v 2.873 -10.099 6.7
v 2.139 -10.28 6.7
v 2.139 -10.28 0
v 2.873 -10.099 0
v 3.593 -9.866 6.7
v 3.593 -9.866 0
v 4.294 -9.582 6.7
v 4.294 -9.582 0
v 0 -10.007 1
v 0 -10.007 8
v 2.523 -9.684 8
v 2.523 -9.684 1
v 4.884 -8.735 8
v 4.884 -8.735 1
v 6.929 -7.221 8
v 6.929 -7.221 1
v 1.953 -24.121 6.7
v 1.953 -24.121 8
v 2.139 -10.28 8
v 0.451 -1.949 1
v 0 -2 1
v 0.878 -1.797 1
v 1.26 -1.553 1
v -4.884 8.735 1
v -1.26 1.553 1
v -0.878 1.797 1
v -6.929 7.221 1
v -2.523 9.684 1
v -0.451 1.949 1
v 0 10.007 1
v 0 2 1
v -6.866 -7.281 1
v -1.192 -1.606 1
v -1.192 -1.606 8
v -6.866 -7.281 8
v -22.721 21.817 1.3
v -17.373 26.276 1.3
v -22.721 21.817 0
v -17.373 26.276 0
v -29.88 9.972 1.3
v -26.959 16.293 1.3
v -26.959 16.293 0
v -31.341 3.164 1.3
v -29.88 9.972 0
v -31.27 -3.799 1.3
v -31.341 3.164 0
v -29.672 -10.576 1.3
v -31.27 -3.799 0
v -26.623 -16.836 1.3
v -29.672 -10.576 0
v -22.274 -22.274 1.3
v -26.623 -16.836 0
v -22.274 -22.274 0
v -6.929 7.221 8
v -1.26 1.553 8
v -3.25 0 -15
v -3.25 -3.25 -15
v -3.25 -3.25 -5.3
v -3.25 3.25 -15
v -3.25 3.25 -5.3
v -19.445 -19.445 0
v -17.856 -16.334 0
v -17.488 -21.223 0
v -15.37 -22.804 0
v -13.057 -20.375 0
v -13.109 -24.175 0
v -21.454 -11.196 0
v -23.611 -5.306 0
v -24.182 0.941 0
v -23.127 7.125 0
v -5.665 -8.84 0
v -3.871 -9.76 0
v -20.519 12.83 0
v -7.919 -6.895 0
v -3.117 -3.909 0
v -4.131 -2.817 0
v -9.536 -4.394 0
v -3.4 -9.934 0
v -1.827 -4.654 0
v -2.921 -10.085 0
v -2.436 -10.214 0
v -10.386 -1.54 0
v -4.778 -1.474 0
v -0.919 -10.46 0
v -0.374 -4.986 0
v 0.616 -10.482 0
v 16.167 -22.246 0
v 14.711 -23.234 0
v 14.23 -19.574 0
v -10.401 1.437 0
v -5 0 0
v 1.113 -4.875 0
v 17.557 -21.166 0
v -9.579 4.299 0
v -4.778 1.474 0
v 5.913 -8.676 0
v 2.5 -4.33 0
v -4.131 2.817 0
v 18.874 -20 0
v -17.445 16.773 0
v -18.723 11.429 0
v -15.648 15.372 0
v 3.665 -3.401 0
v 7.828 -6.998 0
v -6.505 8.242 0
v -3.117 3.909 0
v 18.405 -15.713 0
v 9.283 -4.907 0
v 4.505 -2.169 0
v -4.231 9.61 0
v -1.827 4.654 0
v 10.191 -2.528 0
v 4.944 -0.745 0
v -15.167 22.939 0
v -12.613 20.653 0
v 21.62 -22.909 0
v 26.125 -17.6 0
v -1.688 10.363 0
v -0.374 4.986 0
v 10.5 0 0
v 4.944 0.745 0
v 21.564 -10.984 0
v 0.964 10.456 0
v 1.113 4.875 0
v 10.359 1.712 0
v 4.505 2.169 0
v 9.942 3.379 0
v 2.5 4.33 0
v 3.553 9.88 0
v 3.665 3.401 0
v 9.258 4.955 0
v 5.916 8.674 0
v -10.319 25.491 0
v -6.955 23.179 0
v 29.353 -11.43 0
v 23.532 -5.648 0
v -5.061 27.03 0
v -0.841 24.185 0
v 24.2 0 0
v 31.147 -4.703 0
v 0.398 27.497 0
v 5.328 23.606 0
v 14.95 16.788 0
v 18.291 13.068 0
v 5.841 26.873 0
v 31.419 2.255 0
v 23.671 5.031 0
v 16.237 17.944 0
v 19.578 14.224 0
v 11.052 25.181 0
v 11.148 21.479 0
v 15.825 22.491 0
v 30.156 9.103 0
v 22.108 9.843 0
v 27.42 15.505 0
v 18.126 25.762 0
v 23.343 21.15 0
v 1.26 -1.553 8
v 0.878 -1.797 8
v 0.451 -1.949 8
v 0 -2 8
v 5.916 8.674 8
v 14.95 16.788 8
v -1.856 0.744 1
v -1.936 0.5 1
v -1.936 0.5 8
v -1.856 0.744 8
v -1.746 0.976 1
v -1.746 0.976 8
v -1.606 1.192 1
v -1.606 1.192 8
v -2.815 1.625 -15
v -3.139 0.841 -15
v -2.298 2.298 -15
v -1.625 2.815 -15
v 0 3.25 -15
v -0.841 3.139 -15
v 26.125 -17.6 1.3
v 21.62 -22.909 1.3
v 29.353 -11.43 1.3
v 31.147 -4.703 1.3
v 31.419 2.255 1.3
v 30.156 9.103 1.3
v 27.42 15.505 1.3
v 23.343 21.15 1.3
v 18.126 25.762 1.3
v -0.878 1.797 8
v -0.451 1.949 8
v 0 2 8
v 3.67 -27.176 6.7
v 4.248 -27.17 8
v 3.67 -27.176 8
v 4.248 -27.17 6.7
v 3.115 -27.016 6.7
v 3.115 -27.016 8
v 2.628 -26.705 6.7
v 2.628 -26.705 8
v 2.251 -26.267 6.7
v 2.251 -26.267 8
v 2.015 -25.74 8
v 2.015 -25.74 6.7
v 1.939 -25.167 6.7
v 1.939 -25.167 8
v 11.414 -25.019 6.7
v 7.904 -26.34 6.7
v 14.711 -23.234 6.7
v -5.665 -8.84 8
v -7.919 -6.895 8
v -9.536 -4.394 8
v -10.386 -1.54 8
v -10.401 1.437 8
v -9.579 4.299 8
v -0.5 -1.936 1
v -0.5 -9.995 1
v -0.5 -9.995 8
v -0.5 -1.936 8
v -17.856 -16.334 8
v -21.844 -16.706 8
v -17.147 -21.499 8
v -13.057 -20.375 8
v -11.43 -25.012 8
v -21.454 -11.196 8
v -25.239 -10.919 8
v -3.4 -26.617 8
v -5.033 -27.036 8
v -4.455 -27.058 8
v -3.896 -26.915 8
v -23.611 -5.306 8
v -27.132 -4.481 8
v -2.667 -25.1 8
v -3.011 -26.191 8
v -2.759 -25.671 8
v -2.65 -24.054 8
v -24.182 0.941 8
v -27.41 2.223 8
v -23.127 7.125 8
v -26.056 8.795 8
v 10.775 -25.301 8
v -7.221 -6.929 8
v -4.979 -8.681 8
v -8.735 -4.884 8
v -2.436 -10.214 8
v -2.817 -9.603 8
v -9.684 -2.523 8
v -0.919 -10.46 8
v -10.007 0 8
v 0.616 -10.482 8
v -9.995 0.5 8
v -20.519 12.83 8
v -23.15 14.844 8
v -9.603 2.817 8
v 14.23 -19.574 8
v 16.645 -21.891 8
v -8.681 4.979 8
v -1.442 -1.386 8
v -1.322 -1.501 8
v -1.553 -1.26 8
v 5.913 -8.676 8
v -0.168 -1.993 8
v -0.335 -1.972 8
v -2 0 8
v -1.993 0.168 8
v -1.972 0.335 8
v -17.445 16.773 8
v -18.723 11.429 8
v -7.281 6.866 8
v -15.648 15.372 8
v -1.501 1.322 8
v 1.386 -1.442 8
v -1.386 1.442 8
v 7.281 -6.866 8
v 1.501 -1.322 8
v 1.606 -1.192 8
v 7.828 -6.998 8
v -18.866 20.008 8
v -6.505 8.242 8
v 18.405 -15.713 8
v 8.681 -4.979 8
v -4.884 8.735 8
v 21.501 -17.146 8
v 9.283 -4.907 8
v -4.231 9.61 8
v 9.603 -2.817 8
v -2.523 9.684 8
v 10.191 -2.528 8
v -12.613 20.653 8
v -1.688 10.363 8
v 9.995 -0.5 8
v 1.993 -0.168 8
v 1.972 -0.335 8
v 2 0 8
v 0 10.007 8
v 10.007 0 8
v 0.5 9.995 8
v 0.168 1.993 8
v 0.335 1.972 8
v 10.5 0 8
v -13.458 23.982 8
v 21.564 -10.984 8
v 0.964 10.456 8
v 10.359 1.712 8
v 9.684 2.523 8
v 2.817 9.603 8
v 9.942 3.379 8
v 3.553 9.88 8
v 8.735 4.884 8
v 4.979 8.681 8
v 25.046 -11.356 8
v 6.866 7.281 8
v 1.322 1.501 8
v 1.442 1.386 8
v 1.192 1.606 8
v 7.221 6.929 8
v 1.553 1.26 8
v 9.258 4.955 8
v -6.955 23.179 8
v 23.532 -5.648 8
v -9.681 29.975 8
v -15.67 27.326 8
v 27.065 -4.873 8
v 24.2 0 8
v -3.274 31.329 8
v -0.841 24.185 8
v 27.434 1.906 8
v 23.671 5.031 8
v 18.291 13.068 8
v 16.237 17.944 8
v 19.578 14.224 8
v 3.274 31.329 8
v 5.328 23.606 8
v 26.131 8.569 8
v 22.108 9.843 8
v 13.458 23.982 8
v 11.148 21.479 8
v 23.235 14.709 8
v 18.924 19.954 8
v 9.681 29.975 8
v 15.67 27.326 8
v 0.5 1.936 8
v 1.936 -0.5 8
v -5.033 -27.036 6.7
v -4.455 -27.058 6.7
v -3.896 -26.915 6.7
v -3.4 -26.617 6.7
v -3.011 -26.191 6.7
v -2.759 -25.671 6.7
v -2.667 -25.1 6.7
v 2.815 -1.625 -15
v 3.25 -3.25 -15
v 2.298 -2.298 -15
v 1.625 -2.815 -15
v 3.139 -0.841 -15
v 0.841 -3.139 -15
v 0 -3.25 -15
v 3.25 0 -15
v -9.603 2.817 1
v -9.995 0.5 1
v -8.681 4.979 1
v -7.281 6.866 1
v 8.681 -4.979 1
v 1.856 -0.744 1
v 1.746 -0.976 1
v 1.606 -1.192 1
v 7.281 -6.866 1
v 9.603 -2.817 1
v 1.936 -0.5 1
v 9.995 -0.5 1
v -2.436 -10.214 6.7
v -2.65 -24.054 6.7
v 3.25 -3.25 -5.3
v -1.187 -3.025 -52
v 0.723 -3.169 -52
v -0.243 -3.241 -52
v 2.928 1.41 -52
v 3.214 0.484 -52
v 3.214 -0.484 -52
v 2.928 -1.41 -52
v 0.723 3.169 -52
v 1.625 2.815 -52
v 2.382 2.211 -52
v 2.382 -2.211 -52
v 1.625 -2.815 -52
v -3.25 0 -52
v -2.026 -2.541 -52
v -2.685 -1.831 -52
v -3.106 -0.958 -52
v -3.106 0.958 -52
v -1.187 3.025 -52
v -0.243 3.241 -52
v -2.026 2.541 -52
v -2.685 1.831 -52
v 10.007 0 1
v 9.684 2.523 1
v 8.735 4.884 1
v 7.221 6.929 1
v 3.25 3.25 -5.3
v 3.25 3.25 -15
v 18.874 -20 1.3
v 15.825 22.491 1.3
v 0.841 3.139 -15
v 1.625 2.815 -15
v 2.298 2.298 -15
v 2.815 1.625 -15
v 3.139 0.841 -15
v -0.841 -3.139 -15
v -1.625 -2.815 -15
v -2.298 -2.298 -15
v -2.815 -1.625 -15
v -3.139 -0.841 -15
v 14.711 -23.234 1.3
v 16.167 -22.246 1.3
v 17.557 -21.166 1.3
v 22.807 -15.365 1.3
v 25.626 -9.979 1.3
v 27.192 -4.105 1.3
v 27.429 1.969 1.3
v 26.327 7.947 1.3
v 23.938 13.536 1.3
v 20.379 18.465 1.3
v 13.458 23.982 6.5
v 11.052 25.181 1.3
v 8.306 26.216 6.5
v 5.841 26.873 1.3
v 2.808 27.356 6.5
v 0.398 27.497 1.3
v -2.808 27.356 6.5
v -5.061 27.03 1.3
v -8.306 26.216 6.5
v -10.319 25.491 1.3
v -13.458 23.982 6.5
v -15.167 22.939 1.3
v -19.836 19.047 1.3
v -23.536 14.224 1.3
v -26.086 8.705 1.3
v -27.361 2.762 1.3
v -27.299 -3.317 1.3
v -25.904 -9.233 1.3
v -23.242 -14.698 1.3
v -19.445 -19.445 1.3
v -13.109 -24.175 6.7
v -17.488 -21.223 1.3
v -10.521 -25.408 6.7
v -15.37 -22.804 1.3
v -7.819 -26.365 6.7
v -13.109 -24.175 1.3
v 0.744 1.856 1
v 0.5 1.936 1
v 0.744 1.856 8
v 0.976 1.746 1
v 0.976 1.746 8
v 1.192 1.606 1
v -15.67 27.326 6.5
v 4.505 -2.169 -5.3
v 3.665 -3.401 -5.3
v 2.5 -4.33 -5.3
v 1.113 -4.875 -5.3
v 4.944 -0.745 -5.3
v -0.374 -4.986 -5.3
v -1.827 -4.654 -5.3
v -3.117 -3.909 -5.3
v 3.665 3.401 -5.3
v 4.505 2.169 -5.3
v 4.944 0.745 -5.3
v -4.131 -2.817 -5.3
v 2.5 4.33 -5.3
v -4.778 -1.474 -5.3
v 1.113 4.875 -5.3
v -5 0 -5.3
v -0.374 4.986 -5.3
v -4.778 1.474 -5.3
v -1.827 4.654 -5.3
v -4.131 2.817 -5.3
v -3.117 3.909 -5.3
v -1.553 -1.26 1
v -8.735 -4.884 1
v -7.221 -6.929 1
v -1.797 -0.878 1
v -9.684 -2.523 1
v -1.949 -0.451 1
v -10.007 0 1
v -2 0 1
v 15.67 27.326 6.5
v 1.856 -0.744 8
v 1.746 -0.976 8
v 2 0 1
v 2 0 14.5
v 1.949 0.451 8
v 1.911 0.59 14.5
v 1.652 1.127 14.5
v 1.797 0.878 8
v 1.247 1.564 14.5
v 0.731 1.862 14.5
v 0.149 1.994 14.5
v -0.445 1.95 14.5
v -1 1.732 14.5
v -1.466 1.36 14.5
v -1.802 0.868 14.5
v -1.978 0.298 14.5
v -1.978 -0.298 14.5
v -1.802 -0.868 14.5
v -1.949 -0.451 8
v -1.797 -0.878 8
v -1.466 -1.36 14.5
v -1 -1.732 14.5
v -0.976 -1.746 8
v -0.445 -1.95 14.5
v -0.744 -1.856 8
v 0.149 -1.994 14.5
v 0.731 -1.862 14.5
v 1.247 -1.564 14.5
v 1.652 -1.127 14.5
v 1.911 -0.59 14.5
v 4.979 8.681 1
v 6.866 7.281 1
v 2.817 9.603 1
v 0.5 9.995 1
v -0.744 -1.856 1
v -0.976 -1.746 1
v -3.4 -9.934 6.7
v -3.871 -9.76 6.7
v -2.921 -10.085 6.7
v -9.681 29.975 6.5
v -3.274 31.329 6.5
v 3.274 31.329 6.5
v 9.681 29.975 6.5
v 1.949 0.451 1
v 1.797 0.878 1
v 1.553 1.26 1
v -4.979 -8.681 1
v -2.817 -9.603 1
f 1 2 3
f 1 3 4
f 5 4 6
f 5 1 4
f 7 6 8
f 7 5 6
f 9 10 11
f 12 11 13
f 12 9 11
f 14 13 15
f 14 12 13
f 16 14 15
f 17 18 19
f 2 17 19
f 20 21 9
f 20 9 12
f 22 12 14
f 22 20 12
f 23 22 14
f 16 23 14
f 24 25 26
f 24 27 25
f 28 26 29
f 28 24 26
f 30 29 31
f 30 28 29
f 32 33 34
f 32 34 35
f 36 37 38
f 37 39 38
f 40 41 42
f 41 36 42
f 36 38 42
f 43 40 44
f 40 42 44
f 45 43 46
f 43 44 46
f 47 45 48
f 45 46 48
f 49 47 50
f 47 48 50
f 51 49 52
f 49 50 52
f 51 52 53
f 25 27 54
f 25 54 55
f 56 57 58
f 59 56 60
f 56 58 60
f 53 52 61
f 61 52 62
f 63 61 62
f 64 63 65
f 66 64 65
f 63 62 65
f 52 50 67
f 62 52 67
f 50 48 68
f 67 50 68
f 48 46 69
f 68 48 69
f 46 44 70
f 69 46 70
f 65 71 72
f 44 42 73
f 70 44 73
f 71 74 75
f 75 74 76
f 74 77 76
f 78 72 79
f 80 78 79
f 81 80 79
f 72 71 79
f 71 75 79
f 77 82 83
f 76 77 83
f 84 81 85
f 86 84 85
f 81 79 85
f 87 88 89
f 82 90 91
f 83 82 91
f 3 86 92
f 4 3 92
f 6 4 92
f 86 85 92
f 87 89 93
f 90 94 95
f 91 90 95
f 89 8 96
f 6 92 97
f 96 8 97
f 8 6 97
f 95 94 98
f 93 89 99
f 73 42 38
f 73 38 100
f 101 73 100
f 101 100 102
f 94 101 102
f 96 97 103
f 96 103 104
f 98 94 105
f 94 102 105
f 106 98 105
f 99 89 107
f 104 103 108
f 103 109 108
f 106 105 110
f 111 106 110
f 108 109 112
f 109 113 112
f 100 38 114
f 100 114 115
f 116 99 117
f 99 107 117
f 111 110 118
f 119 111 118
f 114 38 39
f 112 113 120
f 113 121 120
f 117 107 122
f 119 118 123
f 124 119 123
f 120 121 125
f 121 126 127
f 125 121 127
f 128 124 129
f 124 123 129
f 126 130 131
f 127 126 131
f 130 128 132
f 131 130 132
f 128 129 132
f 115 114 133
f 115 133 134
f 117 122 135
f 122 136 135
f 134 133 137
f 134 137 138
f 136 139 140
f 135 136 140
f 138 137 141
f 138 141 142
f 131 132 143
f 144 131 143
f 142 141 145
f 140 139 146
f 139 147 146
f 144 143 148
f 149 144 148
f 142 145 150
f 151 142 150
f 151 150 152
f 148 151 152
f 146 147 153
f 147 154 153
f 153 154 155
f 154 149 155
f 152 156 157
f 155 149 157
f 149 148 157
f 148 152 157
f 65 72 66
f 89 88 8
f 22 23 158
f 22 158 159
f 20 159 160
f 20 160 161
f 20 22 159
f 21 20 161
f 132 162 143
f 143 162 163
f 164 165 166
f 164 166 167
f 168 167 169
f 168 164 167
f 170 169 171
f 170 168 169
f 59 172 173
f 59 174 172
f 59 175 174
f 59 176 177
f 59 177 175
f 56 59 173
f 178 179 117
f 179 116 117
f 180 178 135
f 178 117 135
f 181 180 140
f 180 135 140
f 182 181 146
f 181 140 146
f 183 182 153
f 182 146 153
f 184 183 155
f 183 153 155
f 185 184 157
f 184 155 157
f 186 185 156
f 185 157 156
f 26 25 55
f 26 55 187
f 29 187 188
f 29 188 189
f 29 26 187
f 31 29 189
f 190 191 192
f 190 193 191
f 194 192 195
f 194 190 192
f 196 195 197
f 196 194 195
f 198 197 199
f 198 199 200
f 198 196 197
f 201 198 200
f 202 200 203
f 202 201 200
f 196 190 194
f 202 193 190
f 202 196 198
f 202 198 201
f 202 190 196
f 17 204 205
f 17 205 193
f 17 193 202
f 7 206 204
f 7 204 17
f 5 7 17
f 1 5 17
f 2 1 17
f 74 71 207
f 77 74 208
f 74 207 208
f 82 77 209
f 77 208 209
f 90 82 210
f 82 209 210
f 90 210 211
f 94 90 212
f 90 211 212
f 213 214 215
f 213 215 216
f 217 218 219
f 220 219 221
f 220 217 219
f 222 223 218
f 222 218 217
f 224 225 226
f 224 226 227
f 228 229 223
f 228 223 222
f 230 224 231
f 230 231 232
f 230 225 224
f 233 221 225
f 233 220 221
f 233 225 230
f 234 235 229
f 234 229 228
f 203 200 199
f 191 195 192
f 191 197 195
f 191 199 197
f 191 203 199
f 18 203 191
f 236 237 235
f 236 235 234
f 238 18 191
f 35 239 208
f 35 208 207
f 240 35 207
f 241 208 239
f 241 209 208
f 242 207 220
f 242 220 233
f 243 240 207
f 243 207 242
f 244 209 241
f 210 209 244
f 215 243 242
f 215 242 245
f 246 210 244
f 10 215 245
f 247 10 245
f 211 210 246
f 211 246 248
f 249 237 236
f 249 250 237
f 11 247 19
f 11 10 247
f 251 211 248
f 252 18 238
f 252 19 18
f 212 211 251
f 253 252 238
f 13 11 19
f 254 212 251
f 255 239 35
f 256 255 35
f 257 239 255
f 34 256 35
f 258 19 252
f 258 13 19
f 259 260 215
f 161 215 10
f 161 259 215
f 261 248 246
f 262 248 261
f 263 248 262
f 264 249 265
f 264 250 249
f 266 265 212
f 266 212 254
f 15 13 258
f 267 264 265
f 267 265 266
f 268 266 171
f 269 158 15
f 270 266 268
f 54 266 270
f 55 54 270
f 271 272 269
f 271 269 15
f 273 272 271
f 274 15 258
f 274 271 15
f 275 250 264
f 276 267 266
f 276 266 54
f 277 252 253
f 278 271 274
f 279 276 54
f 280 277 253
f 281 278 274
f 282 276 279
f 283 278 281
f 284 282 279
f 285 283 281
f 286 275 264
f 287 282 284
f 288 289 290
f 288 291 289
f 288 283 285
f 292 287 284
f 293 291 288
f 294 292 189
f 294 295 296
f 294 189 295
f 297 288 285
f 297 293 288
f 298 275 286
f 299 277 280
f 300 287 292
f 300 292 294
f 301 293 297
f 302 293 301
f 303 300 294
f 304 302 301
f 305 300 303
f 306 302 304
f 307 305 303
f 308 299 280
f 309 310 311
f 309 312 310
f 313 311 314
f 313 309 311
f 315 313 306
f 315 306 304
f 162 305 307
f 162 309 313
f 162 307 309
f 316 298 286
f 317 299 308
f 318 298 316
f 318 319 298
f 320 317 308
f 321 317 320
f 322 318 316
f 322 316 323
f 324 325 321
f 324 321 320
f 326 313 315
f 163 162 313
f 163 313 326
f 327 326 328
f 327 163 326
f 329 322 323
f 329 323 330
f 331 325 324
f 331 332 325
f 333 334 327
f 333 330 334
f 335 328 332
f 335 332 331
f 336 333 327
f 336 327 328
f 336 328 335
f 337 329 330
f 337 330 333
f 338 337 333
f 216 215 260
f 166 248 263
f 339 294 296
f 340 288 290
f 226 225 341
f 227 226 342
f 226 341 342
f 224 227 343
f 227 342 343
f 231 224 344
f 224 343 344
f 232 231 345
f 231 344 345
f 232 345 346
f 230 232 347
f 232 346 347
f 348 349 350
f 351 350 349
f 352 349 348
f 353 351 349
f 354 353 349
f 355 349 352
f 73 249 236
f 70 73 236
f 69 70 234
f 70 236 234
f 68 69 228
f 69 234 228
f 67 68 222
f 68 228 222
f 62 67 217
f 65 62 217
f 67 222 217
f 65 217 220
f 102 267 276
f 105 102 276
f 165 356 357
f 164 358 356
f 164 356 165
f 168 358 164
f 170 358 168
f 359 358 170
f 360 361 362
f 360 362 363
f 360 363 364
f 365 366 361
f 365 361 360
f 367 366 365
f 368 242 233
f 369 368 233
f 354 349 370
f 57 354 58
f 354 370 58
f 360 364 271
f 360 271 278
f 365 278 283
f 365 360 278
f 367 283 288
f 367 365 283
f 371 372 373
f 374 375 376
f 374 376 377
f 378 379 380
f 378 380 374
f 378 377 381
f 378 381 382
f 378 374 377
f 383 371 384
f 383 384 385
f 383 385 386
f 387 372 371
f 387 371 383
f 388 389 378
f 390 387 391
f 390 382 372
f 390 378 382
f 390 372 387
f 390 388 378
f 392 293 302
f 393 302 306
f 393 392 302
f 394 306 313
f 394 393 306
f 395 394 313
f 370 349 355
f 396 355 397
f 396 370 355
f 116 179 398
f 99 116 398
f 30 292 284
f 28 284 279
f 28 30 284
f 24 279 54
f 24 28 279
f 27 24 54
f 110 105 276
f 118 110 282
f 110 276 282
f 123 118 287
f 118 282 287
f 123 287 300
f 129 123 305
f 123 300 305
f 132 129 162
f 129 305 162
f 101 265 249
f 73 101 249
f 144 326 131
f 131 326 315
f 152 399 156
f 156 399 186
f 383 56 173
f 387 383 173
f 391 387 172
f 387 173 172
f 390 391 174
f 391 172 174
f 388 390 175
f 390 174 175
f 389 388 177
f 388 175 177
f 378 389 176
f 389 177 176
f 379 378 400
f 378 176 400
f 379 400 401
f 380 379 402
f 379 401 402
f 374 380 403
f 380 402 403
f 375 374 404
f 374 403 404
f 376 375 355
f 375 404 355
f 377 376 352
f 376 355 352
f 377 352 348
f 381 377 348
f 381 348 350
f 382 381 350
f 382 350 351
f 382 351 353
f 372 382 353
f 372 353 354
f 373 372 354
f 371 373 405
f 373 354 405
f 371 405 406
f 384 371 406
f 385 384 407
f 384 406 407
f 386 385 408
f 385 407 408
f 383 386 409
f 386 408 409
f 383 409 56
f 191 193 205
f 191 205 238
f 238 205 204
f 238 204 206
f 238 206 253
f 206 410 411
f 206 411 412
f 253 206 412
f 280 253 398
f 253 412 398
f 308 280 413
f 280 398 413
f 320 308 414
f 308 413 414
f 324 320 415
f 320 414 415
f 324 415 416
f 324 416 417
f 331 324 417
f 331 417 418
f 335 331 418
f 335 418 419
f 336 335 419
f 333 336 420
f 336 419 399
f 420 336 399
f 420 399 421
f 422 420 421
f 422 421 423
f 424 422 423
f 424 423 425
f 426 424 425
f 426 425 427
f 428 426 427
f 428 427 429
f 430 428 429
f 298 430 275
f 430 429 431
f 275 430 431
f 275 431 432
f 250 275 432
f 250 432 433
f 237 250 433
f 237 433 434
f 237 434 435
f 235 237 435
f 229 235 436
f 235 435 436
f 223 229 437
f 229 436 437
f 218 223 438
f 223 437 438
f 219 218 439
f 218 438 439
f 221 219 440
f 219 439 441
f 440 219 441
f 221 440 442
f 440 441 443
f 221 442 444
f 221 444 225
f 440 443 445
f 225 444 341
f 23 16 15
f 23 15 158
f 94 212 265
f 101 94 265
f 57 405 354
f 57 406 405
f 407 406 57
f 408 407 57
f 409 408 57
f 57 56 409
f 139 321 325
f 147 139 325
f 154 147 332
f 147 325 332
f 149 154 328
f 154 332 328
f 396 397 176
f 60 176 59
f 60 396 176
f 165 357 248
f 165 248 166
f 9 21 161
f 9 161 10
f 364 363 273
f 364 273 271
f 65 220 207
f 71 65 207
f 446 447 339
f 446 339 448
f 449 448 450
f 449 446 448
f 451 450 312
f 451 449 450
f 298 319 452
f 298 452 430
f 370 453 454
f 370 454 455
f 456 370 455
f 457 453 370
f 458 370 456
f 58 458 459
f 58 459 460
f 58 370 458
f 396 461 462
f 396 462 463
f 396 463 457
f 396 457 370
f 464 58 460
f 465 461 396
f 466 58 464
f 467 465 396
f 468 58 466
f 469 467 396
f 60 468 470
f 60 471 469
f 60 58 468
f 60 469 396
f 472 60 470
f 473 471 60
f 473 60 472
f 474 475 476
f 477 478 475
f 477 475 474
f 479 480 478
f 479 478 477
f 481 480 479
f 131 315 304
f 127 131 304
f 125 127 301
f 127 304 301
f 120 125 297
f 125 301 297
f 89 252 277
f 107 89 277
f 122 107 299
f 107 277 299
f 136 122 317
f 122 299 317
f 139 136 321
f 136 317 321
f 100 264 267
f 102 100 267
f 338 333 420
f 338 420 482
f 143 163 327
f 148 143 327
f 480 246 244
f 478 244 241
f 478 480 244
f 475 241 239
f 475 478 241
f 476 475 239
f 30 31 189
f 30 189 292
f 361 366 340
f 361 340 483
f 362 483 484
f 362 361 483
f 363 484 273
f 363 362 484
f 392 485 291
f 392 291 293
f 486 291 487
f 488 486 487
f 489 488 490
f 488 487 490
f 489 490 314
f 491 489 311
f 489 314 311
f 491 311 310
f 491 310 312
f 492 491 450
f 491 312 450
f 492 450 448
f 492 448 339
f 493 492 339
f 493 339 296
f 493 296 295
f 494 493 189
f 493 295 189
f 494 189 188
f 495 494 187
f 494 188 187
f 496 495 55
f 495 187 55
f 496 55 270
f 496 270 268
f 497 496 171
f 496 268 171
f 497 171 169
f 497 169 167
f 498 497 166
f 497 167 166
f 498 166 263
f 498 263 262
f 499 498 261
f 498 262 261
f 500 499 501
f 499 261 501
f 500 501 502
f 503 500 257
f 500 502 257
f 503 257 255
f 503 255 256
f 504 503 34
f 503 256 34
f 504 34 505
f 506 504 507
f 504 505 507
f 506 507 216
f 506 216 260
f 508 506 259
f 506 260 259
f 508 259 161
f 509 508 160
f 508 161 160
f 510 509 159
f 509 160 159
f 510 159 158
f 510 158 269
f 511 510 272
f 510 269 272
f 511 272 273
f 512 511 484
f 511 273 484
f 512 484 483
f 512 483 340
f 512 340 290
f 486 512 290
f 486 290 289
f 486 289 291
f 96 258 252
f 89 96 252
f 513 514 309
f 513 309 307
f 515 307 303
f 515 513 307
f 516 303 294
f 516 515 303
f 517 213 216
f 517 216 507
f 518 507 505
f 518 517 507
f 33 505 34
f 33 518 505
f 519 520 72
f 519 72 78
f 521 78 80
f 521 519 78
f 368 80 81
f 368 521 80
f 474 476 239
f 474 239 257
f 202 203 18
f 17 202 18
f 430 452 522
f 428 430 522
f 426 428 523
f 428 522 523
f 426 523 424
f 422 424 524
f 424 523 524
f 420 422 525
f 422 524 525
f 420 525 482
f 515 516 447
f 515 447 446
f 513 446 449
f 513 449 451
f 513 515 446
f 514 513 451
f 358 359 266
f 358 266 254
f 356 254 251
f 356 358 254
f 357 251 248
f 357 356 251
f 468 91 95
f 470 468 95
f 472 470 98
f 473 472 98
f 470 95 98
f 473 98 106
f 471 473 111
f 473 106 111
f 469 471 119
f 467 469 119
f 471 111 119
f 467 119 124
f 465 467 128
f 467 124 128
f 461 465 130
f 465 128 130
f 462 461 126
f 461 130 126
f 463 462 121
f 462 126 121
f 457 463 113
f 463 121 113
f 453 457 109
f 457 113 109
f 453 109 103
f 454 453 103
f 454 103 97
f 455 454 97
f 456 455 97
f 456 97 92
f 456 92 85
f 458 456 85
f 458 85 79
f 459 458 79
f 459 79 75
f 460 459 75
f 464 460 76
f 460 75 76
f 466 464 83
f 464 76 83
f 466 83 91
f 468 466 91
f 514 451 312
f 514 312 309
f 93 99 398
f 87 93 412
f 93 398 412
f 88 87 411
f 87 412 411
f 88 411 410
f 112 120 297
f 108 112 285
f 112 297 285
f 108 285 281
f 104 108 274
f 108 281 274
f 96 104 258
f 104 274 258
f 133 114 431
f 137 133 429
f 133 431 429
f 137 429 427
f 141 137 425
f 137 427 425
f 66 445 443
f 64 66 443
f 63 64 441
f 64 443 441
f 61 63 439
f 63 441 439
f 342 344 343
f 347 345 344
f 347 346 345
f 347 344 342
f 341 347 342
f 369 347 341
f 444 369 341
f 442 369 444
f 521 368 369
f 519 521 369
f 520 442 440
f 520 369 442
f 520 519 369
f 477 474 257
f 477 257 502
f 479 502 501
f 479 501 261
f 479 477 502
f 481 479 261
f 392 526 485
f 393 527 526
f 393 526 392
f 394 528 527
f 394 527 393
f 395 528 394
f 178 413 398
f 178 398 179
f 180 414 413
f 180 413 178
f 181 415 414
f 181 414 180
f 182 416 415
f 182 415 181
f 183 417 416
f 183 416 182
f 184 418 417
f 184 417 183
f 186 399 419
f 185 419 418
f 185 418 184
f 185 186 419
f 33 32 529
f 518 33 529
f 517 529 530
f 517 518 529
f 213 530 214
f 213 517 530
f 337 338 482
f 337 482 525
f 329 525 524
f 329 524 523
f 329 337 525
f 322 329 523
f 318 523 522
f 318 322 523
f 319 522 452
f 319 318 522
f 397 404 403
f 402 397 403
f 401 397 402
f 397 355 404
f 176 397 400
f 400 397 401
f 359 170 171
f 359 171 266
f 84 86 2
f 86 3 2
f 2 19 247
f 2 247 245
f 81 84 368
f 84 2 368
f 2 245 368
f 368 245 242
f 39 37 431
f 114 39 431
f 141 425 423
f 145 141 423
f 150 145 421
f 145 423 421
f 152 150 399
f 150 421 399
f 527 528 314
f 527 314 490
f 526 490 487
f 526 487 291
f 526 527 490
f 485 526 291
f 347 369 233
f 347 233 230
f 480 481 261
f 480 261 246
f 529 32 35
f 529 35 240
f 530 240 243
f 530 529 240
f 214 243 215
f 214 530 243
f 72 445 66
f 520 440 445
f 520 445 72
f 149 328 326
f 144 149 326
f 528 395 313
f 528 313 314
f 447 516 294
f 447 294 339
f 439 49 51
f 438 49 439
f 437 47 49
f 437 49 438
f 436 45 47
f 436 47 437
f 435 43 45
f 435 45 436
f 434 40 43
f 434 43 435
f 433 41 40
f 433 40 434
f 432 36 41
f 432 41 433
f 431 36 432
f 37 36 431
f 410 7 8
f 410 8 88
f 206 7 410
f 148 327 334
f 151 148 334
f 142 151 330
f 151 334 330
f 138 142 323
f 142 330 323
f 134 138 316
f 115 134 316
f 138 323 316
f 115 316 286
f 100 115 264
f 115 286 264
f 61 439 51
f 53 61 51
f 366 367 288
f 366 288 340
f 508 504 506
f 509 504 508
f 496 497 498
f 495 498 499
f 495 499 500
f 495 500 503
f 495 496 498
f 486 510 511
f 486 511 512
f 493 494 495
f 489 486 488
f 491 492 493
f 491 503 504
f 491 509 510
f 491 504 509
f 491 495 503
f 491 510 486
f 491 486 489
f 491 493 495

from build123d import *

# Parameters (mm, degrees)
CROQUIS1_R                 = 31.5
SALIENTE_EXTRUIR1_DEPTH    = 8
CORTAR_EXTRUIR2_START      = -6.7
CROQUIS2_R                 = 31.5
CROQUIS2_R_2               = 27.5
CORTAR_EXTRUIR2_DEPTH      = 6.7
CORTAR_EXTRUIR4_DEPTH      = 46.260357931
CORTAR_EXTRUIR5_DEPTH      = 46.260357931
CORTAR_EXTRUIR6_DEPTH      = 46.04875137
CORTAR_EXTRUIR7_DEPTH      = 46.04875137
CORTAR_EXTRUIR8_START      = -6.7
CORTAR_EXTRUIR8_DEPTH      = 6.7
REDONDEO1_R                = 2
SALIENTE_EXTRUIR2_DEPTH    = 1.5
CORTAR_EXTRUIR9_DEPTH      = 46.260357931
CORTAR_EXTRUIR9_DEPTH_BACK = 7
CROQUIS9_R                 = 2
SALIENTE_EXTRUIR3_DEPTH    = 6.5
CROQUIS10_R                = 5
CROQUIS10_W                = 6.5
CROQUIS10_H                = 6.5
SALIENTE_EXTRUIR5_DEPTH    = 5.3
CROQUIS10_3_W              = 6.5
CROQUIS10_3_H              = 6.5
SALIENTE_EXTRUIR6_DEPTH    = 15
CROQUIS11_R                = 3.25
SALIENTE_EXTRUIR7_DEPTH    = 37


with BuildPart() as part:
    # Croquis1 → Saliente-Extruir1 (new body)
    with BuildSketch(Plane.XY):
        Circle(CROQUIS1_R)
    extrude(amount=SALIENTE_EXTRUIR1_DEPTH)

    # Croquis2 → Cortar-Extruir2 (cut)
    with BuildSketch(Plane.XY.offset(8).offset(CORTAR_EXTRUIR2_START)):
        Circle(CROQUIS2_R)
        Circle(CROQUIS2_R_2, mode=Mode.SUBTRACT)
    extrude(amount=CORTAR_EXTRUIR2_DEPTH, mode=Mode.SUBTRACT)

    # Croquis3 → Cortar-Extruir4 (cut, through all)
    with BuildSketch(Plane.XY.offset(8)):
        with BuildLine():
            Line((-9.579379365, 4.299475663), (-20.51909885, 12.829909679))
            ThreePointArc((-20.51909885, 12.829909679), (-23.611186728, -5.305832762), (-13.057369721, -20.375109717))
            Line((-13.057369721, -20.375109717), (-5.665387689, -8.840440166))
            ThreePointArc((-5.665387689, -8.840440166), (-10.063055085, -2.997486008), (-9.579379365, 4.299475663))
        make_face()
        with BuildLine():
            ThreePointArc((16.237061362, 17.944298212), (-0.84115789, 24.185376851), (-17.444510686, 16.77286639))
            Line((-17.444510686, 16.77286639), (-6.504791201, 8.242432373))
            ThreePointArc((-6.504791201, 8.242432373), (-0.3649652, 10.493655245), (5.916429122, 8.674437529))
            Line((5.916429122, 8.674437529), (16.237061362, 17.944298212))
        make_face()
        with BuildLine():
            ThreePointArc((14.229512126, -19.574498325), (23.902558724, -3.782550254), (19.578157945, 14.224476493))
            Line((19.578157945, 14.224476493), (9.257525705, 4.954615809))
            ThreePointArc((9.257525705, 4.954615809), (10.197616725, -2.501722034), (5.913499206, -8.676435163))
            Line((5.913499206, -8.676435163), (14.229512126, -19.574498325))
        make_face()
    extrude(amount=-CORTAR_EXTRUIR4_DEPTH, mode=Mode.SUBTRACT)

    # Croquis3<4> → Cortar-Extruir5 (cut, through all)
    with BuildSketch(Plane.XY.offset(8)):
        with BuildLine():
            ThreePointArc((-2.701947276, -27.366941388), (-0.398068092, -27.497118791), (1.908613915, -27.433687192))
            Line((1.908613915, -27.433687192), (2.138825202, -10.279855386))
            ThreePointArc((2.138825202, -10.279855386), (-0.151989635, -10.498899902), (-2.435503713, -10.213634107))
            Line((-2.435503713, -10.213634107), (-2.701947276, -27.366941388))
        make_face()
    extrude(amount=-CORTAR_EXTRUIR5_DEPTH, mode=Mode.SUBTRACT)

    # Croquis4 → Cortar-Extruir6 (cut, through all)
    with BuildSketch(Plane.XY.offset(1.3)):
        Polygon((-2.701947276, -27.366941388), (1.908613915, -27.433687192), (1.818382526, -33.666548493), (-2.792178664, -33.599802689), align=None)
    extrude(amount=-CORTAR_EXTRUIR6_DEPTH, mode=Mode.SUBTRACT)

    # Croquis5 → Cortar-Extruir7 (cut, through all)
    with BuildSketch(Plane.XY.offset(1.3)):
        with BuildLine():
            Line((15.824611578, 22.490701821), (18.126373262, 25.762076631))
            ThreePointArc((18.126373262, 25.762076631), (0.455968906, 31.496699706), (-17.373032714, 26.275991595))
            Line((-17.373032714, 26.275991595), (-15.166933322, 22.939357742))
            ThreePointArc((-15.166933322, 22.939357742), (0.398068092, 27.497118791), (15.824611578, 22.490701821))
        make_face()
        with BuildLine():
            Line((21.619759605, -22.909299305), (18.874393306, -20.000181933))
            ThreePointArc((18.874393306, -20.000181933), (11.036194878, -25.188338623), (1.908613915, -27.433687192))
            Line((1.908613915, -27.433687192), (1.850534631, -31.445596219))
            ThreePointArc((1.850534631, -31.445596219), (12.487224236, -28.919184478), (21.619759605, -22.909299305))
        make_face()
        with BuildLine():
            ThreePointArc((-2.701947276, -27.366941388), (-11.760706264, -24.858314267), (-19.445436483, -19.445436483))
            Line((-19.445436483, -19.445436483), (-22.273863607, -22.273863607))
            ThreePointArc((-22.273863607, -22.273863607), (-13.319125738, -28.545593173), (-2.76002656, -31.378850415))
            Line((-2.76002656, -31.378850415), (-2.701947276, -27.366941388))
        make_face()
    extrude(amount=-CORTAR_EXTRUIR7_DEPTH, mode=Mode.SUBTRACT)

    # Croquis6 → Cortar-Extruir8 (cut)
    with BuildSketch(Plane(origin=(0, 0, 0), x_dir=(-1, 0, 0), z_dir=(0, 0, -1)).offset(CORTAR_EXTRUIR8_START)):
        with BuildLine():
            Line((-4.293632906, -9.581999607), (-14.711263483, -23.234214571))
            ThreePointArc((-14.711263483, -23.234214571), (-0.92900238, -27.484303786), (13.108789939, -24.174565691))
            Line((13.108789939, -24.174565691), (3.871385851, -9.760244443))
            ThreePointArc((3.871385851, -9.760244443), (-0.229163587, -10.497498943), (-4.293632906, -9.581999607))
        make_face()
    extrude(amount=CORTAR_EXTRUIR8_DEPTH, mode=Mode.SUBTRACT)

    # Redondeo1
    redondeo1_edges = [part.edges().sort_by_distance(p)[0] for p in [
        (1.908613915, -27.433687192, 7.35),
        (-2.701947276, -27.366941388, 7.35),
    ]]
    fillet(redondeo1_edges, radius=REDONDEO1_R)

    # Croquis7 → Saliente-Extruir2 (add)
    with BuildSketch(Plane.XY.offset(8)):
        with BuildLine():
            Line((-15.669662975, 27.326025365), (-13.458452317, 23.981660935))
            ThreePointArc((-13.458452317, 23.981660935), (0, 27.5), (13.458452317, 23.981660935))
            Line((13.458452317, 23.981660935), (15.669662975, 27.326025365))
            ThreePointArc((15.669662975, 27.326025365), (0, 31.5), (-15.669662975, 27.326025365))
        make_face()
    extrude(amount=-SALIENTE_EXTRUIR2_DEPTH)

    # Croquis8 → Cortar-Extruir9 (cut, two sides: drawn at the far end of the back side and taken through both)
    with BuildSketch(Plane.XY.offset(8).offset(-CORTAR_EXTRUIR9_DEPTH_BACK)):
        with BuildLine():
            ThreePointArc((-1.260412408, 1.552855615), (-0.668688556, 1.884902017), (0, 2))
            Line((0, 2), (0, 10.00738946))
            ThreePointArc((0, 10.00738946), (-3.733928755, 9.284698157), (-6.928560453, 7.22100366))
            Line((-6.928560453, 7.22100366), (-1.260412408, 1.552855615))
        make_face()
        with BuildLine():
            Line((0.5, 9.994890885), (0.5, 1.936491673))
            ThreePointArc((0.5, 1.936491673), (0.861766275, 1.804815472), (1.19160121, 1.606264784))
            Line((1.19160121, 1.606264784), (6.865923152, 7.280586726))
            ThreePointArc((6.865923152, 7.280586726), (3.925056399, 9.205529646), (0.5, 9.994890885))
        make_face()
        with BuildLine():
            ThreePointArc((-1.936491673, 0.5), (-1.804815472, 0.861766275), (-1.606264784, 1.19160121))
            Line((-1.606264784, 1.19160121), (-7.280586726, 6.865923152))
            ThreePointArc((-7.280586726, 6.865923152), (-9.205529646, 3.925056399), (-9.994890885, 0.5))
            Line((-9.994890885, 0.5), (-1.936491673, 0.5))
        make_face()
        with BuildLine():
            Line((7.22100366, 6.928560453), (1.552855615, 1.260412408))
            ThreePointArc((1.552855615, 1.260412408), (1.884902017, 0.668688556), (2, 0))
            Line((2, 0), (10.00738946, 0))
            ThreePointArc((10.00738946, 0), (9.284698157, 3.733928755), (7.22100366, 6.928560453))
        make_face()
        with BuildLine():
            ThreePointArc((-1.552855615, -1.260412408), (-1.884902017, -0.668688556), (-2, 0))
            Line((-2, 0), (-10.00738946, 0))
            ThreePointArc((-10.00738946, 0), (-9.284698157, -3.733928755), (-7.22100366, -6.928560453))
            Line((-7.22100366, -6.928560453), (-1.552855615, -1.260412408))
        make_face()
        with BuildLine():
            Line((9.994890885, -0.5), (1.936491673, -0.5))
            ThreePointArc((1.936491673, -0.5), (1.804815472, -0.861766275), (1.606264784, -1.19160121))
            Line((1.606264784, -1.19160121), (7.280586726, -6.865923152))
            ThreePointArc((7.280586726, -6.865923152), (9.205529646, -3.925056399), (9.994890885, -0.5))
        make_face()
        with BuildLine():
            ThreePointArc((-0.5, -1.936491673), (-0.861766275, -1.804815472), (-1.19160121, -1.606264784))
            Line((-1.19160121, -1.606264784), (-6.865923152, -7.280586726))
            ThreePointArc((-6.865923152, -7.280586726), (-3.925056399, -9.205529646), (-0.5, -9.994890885))
            Line((-0.5, -9.994890885), (-0.5, -1.936491673))
        make_face()
        with BuildLine():
            Line((6.928560453, -7.22100366), (1.260412408, -1.552855615))
            ThreePointArc((1.260412408, -1.552855615), (0.668688556, -1.884902017), (0, -2))
            Line((0, -2), (0, -10.00738946))
            ThreePointArc((0, -10.00738946), (3.733928755, -9.284698157), (6.928560453, -7.22100366))
        make_face()
    extrude(amount=CORTAR_EXTRUIR9_DEPTH + CORTAR_EXTRUIR9_DEPTH_BACK, mode=Mode.SUBTRACT)

    # Croquis9 → Saliente-Extruir3 (add)
    with BuildSketch(Plane.XY.offset(8)):
        Circle(CROQUIS9_R)
    extrude(amount=SALIENTE_EXTRUIR3_DEPTH)

    # Croquis10 → Saliente-Extruir5 (add)
    with BuildSketch(Plane(origin=(0, 0, 0), x_dir=(-1, 0, 0), z_dir=(0, 0, -1))):
        Circle(CROQUIS10_R)
        Rectangle(CROQUIS10_W, CROQUIS10_H, mode=Mode.SUBTRACT)
    extrude(amount=SALIENTE_EXTRUIR5_DEPTH)

    # Croquis10<3> → Saliente-Extruir6 (add)
    with BuildSketch(Plane(origin=(0, 0, 0), x_dir=(-1, 0, 0), z_dir=(0, 0, -1))):
        Rectangle(CROQUIS10_3_W, CROQUIS10_3_H)
    extrude(amount=SALIENTE_EXTRUIR6_DEPTH)

    # Croquis11 → Saliente-Extruir7 (add)
    with BuildSketch(Plane(origin=(0, 0, -15), x_dir=(-1, 0, 0), z_dir=(0, 0, -1))):
        Circle(CROQUIS11_R)
    extrude(amount=SALIENTE_EXTRUIR7_DEPTH)


solid = part.part
